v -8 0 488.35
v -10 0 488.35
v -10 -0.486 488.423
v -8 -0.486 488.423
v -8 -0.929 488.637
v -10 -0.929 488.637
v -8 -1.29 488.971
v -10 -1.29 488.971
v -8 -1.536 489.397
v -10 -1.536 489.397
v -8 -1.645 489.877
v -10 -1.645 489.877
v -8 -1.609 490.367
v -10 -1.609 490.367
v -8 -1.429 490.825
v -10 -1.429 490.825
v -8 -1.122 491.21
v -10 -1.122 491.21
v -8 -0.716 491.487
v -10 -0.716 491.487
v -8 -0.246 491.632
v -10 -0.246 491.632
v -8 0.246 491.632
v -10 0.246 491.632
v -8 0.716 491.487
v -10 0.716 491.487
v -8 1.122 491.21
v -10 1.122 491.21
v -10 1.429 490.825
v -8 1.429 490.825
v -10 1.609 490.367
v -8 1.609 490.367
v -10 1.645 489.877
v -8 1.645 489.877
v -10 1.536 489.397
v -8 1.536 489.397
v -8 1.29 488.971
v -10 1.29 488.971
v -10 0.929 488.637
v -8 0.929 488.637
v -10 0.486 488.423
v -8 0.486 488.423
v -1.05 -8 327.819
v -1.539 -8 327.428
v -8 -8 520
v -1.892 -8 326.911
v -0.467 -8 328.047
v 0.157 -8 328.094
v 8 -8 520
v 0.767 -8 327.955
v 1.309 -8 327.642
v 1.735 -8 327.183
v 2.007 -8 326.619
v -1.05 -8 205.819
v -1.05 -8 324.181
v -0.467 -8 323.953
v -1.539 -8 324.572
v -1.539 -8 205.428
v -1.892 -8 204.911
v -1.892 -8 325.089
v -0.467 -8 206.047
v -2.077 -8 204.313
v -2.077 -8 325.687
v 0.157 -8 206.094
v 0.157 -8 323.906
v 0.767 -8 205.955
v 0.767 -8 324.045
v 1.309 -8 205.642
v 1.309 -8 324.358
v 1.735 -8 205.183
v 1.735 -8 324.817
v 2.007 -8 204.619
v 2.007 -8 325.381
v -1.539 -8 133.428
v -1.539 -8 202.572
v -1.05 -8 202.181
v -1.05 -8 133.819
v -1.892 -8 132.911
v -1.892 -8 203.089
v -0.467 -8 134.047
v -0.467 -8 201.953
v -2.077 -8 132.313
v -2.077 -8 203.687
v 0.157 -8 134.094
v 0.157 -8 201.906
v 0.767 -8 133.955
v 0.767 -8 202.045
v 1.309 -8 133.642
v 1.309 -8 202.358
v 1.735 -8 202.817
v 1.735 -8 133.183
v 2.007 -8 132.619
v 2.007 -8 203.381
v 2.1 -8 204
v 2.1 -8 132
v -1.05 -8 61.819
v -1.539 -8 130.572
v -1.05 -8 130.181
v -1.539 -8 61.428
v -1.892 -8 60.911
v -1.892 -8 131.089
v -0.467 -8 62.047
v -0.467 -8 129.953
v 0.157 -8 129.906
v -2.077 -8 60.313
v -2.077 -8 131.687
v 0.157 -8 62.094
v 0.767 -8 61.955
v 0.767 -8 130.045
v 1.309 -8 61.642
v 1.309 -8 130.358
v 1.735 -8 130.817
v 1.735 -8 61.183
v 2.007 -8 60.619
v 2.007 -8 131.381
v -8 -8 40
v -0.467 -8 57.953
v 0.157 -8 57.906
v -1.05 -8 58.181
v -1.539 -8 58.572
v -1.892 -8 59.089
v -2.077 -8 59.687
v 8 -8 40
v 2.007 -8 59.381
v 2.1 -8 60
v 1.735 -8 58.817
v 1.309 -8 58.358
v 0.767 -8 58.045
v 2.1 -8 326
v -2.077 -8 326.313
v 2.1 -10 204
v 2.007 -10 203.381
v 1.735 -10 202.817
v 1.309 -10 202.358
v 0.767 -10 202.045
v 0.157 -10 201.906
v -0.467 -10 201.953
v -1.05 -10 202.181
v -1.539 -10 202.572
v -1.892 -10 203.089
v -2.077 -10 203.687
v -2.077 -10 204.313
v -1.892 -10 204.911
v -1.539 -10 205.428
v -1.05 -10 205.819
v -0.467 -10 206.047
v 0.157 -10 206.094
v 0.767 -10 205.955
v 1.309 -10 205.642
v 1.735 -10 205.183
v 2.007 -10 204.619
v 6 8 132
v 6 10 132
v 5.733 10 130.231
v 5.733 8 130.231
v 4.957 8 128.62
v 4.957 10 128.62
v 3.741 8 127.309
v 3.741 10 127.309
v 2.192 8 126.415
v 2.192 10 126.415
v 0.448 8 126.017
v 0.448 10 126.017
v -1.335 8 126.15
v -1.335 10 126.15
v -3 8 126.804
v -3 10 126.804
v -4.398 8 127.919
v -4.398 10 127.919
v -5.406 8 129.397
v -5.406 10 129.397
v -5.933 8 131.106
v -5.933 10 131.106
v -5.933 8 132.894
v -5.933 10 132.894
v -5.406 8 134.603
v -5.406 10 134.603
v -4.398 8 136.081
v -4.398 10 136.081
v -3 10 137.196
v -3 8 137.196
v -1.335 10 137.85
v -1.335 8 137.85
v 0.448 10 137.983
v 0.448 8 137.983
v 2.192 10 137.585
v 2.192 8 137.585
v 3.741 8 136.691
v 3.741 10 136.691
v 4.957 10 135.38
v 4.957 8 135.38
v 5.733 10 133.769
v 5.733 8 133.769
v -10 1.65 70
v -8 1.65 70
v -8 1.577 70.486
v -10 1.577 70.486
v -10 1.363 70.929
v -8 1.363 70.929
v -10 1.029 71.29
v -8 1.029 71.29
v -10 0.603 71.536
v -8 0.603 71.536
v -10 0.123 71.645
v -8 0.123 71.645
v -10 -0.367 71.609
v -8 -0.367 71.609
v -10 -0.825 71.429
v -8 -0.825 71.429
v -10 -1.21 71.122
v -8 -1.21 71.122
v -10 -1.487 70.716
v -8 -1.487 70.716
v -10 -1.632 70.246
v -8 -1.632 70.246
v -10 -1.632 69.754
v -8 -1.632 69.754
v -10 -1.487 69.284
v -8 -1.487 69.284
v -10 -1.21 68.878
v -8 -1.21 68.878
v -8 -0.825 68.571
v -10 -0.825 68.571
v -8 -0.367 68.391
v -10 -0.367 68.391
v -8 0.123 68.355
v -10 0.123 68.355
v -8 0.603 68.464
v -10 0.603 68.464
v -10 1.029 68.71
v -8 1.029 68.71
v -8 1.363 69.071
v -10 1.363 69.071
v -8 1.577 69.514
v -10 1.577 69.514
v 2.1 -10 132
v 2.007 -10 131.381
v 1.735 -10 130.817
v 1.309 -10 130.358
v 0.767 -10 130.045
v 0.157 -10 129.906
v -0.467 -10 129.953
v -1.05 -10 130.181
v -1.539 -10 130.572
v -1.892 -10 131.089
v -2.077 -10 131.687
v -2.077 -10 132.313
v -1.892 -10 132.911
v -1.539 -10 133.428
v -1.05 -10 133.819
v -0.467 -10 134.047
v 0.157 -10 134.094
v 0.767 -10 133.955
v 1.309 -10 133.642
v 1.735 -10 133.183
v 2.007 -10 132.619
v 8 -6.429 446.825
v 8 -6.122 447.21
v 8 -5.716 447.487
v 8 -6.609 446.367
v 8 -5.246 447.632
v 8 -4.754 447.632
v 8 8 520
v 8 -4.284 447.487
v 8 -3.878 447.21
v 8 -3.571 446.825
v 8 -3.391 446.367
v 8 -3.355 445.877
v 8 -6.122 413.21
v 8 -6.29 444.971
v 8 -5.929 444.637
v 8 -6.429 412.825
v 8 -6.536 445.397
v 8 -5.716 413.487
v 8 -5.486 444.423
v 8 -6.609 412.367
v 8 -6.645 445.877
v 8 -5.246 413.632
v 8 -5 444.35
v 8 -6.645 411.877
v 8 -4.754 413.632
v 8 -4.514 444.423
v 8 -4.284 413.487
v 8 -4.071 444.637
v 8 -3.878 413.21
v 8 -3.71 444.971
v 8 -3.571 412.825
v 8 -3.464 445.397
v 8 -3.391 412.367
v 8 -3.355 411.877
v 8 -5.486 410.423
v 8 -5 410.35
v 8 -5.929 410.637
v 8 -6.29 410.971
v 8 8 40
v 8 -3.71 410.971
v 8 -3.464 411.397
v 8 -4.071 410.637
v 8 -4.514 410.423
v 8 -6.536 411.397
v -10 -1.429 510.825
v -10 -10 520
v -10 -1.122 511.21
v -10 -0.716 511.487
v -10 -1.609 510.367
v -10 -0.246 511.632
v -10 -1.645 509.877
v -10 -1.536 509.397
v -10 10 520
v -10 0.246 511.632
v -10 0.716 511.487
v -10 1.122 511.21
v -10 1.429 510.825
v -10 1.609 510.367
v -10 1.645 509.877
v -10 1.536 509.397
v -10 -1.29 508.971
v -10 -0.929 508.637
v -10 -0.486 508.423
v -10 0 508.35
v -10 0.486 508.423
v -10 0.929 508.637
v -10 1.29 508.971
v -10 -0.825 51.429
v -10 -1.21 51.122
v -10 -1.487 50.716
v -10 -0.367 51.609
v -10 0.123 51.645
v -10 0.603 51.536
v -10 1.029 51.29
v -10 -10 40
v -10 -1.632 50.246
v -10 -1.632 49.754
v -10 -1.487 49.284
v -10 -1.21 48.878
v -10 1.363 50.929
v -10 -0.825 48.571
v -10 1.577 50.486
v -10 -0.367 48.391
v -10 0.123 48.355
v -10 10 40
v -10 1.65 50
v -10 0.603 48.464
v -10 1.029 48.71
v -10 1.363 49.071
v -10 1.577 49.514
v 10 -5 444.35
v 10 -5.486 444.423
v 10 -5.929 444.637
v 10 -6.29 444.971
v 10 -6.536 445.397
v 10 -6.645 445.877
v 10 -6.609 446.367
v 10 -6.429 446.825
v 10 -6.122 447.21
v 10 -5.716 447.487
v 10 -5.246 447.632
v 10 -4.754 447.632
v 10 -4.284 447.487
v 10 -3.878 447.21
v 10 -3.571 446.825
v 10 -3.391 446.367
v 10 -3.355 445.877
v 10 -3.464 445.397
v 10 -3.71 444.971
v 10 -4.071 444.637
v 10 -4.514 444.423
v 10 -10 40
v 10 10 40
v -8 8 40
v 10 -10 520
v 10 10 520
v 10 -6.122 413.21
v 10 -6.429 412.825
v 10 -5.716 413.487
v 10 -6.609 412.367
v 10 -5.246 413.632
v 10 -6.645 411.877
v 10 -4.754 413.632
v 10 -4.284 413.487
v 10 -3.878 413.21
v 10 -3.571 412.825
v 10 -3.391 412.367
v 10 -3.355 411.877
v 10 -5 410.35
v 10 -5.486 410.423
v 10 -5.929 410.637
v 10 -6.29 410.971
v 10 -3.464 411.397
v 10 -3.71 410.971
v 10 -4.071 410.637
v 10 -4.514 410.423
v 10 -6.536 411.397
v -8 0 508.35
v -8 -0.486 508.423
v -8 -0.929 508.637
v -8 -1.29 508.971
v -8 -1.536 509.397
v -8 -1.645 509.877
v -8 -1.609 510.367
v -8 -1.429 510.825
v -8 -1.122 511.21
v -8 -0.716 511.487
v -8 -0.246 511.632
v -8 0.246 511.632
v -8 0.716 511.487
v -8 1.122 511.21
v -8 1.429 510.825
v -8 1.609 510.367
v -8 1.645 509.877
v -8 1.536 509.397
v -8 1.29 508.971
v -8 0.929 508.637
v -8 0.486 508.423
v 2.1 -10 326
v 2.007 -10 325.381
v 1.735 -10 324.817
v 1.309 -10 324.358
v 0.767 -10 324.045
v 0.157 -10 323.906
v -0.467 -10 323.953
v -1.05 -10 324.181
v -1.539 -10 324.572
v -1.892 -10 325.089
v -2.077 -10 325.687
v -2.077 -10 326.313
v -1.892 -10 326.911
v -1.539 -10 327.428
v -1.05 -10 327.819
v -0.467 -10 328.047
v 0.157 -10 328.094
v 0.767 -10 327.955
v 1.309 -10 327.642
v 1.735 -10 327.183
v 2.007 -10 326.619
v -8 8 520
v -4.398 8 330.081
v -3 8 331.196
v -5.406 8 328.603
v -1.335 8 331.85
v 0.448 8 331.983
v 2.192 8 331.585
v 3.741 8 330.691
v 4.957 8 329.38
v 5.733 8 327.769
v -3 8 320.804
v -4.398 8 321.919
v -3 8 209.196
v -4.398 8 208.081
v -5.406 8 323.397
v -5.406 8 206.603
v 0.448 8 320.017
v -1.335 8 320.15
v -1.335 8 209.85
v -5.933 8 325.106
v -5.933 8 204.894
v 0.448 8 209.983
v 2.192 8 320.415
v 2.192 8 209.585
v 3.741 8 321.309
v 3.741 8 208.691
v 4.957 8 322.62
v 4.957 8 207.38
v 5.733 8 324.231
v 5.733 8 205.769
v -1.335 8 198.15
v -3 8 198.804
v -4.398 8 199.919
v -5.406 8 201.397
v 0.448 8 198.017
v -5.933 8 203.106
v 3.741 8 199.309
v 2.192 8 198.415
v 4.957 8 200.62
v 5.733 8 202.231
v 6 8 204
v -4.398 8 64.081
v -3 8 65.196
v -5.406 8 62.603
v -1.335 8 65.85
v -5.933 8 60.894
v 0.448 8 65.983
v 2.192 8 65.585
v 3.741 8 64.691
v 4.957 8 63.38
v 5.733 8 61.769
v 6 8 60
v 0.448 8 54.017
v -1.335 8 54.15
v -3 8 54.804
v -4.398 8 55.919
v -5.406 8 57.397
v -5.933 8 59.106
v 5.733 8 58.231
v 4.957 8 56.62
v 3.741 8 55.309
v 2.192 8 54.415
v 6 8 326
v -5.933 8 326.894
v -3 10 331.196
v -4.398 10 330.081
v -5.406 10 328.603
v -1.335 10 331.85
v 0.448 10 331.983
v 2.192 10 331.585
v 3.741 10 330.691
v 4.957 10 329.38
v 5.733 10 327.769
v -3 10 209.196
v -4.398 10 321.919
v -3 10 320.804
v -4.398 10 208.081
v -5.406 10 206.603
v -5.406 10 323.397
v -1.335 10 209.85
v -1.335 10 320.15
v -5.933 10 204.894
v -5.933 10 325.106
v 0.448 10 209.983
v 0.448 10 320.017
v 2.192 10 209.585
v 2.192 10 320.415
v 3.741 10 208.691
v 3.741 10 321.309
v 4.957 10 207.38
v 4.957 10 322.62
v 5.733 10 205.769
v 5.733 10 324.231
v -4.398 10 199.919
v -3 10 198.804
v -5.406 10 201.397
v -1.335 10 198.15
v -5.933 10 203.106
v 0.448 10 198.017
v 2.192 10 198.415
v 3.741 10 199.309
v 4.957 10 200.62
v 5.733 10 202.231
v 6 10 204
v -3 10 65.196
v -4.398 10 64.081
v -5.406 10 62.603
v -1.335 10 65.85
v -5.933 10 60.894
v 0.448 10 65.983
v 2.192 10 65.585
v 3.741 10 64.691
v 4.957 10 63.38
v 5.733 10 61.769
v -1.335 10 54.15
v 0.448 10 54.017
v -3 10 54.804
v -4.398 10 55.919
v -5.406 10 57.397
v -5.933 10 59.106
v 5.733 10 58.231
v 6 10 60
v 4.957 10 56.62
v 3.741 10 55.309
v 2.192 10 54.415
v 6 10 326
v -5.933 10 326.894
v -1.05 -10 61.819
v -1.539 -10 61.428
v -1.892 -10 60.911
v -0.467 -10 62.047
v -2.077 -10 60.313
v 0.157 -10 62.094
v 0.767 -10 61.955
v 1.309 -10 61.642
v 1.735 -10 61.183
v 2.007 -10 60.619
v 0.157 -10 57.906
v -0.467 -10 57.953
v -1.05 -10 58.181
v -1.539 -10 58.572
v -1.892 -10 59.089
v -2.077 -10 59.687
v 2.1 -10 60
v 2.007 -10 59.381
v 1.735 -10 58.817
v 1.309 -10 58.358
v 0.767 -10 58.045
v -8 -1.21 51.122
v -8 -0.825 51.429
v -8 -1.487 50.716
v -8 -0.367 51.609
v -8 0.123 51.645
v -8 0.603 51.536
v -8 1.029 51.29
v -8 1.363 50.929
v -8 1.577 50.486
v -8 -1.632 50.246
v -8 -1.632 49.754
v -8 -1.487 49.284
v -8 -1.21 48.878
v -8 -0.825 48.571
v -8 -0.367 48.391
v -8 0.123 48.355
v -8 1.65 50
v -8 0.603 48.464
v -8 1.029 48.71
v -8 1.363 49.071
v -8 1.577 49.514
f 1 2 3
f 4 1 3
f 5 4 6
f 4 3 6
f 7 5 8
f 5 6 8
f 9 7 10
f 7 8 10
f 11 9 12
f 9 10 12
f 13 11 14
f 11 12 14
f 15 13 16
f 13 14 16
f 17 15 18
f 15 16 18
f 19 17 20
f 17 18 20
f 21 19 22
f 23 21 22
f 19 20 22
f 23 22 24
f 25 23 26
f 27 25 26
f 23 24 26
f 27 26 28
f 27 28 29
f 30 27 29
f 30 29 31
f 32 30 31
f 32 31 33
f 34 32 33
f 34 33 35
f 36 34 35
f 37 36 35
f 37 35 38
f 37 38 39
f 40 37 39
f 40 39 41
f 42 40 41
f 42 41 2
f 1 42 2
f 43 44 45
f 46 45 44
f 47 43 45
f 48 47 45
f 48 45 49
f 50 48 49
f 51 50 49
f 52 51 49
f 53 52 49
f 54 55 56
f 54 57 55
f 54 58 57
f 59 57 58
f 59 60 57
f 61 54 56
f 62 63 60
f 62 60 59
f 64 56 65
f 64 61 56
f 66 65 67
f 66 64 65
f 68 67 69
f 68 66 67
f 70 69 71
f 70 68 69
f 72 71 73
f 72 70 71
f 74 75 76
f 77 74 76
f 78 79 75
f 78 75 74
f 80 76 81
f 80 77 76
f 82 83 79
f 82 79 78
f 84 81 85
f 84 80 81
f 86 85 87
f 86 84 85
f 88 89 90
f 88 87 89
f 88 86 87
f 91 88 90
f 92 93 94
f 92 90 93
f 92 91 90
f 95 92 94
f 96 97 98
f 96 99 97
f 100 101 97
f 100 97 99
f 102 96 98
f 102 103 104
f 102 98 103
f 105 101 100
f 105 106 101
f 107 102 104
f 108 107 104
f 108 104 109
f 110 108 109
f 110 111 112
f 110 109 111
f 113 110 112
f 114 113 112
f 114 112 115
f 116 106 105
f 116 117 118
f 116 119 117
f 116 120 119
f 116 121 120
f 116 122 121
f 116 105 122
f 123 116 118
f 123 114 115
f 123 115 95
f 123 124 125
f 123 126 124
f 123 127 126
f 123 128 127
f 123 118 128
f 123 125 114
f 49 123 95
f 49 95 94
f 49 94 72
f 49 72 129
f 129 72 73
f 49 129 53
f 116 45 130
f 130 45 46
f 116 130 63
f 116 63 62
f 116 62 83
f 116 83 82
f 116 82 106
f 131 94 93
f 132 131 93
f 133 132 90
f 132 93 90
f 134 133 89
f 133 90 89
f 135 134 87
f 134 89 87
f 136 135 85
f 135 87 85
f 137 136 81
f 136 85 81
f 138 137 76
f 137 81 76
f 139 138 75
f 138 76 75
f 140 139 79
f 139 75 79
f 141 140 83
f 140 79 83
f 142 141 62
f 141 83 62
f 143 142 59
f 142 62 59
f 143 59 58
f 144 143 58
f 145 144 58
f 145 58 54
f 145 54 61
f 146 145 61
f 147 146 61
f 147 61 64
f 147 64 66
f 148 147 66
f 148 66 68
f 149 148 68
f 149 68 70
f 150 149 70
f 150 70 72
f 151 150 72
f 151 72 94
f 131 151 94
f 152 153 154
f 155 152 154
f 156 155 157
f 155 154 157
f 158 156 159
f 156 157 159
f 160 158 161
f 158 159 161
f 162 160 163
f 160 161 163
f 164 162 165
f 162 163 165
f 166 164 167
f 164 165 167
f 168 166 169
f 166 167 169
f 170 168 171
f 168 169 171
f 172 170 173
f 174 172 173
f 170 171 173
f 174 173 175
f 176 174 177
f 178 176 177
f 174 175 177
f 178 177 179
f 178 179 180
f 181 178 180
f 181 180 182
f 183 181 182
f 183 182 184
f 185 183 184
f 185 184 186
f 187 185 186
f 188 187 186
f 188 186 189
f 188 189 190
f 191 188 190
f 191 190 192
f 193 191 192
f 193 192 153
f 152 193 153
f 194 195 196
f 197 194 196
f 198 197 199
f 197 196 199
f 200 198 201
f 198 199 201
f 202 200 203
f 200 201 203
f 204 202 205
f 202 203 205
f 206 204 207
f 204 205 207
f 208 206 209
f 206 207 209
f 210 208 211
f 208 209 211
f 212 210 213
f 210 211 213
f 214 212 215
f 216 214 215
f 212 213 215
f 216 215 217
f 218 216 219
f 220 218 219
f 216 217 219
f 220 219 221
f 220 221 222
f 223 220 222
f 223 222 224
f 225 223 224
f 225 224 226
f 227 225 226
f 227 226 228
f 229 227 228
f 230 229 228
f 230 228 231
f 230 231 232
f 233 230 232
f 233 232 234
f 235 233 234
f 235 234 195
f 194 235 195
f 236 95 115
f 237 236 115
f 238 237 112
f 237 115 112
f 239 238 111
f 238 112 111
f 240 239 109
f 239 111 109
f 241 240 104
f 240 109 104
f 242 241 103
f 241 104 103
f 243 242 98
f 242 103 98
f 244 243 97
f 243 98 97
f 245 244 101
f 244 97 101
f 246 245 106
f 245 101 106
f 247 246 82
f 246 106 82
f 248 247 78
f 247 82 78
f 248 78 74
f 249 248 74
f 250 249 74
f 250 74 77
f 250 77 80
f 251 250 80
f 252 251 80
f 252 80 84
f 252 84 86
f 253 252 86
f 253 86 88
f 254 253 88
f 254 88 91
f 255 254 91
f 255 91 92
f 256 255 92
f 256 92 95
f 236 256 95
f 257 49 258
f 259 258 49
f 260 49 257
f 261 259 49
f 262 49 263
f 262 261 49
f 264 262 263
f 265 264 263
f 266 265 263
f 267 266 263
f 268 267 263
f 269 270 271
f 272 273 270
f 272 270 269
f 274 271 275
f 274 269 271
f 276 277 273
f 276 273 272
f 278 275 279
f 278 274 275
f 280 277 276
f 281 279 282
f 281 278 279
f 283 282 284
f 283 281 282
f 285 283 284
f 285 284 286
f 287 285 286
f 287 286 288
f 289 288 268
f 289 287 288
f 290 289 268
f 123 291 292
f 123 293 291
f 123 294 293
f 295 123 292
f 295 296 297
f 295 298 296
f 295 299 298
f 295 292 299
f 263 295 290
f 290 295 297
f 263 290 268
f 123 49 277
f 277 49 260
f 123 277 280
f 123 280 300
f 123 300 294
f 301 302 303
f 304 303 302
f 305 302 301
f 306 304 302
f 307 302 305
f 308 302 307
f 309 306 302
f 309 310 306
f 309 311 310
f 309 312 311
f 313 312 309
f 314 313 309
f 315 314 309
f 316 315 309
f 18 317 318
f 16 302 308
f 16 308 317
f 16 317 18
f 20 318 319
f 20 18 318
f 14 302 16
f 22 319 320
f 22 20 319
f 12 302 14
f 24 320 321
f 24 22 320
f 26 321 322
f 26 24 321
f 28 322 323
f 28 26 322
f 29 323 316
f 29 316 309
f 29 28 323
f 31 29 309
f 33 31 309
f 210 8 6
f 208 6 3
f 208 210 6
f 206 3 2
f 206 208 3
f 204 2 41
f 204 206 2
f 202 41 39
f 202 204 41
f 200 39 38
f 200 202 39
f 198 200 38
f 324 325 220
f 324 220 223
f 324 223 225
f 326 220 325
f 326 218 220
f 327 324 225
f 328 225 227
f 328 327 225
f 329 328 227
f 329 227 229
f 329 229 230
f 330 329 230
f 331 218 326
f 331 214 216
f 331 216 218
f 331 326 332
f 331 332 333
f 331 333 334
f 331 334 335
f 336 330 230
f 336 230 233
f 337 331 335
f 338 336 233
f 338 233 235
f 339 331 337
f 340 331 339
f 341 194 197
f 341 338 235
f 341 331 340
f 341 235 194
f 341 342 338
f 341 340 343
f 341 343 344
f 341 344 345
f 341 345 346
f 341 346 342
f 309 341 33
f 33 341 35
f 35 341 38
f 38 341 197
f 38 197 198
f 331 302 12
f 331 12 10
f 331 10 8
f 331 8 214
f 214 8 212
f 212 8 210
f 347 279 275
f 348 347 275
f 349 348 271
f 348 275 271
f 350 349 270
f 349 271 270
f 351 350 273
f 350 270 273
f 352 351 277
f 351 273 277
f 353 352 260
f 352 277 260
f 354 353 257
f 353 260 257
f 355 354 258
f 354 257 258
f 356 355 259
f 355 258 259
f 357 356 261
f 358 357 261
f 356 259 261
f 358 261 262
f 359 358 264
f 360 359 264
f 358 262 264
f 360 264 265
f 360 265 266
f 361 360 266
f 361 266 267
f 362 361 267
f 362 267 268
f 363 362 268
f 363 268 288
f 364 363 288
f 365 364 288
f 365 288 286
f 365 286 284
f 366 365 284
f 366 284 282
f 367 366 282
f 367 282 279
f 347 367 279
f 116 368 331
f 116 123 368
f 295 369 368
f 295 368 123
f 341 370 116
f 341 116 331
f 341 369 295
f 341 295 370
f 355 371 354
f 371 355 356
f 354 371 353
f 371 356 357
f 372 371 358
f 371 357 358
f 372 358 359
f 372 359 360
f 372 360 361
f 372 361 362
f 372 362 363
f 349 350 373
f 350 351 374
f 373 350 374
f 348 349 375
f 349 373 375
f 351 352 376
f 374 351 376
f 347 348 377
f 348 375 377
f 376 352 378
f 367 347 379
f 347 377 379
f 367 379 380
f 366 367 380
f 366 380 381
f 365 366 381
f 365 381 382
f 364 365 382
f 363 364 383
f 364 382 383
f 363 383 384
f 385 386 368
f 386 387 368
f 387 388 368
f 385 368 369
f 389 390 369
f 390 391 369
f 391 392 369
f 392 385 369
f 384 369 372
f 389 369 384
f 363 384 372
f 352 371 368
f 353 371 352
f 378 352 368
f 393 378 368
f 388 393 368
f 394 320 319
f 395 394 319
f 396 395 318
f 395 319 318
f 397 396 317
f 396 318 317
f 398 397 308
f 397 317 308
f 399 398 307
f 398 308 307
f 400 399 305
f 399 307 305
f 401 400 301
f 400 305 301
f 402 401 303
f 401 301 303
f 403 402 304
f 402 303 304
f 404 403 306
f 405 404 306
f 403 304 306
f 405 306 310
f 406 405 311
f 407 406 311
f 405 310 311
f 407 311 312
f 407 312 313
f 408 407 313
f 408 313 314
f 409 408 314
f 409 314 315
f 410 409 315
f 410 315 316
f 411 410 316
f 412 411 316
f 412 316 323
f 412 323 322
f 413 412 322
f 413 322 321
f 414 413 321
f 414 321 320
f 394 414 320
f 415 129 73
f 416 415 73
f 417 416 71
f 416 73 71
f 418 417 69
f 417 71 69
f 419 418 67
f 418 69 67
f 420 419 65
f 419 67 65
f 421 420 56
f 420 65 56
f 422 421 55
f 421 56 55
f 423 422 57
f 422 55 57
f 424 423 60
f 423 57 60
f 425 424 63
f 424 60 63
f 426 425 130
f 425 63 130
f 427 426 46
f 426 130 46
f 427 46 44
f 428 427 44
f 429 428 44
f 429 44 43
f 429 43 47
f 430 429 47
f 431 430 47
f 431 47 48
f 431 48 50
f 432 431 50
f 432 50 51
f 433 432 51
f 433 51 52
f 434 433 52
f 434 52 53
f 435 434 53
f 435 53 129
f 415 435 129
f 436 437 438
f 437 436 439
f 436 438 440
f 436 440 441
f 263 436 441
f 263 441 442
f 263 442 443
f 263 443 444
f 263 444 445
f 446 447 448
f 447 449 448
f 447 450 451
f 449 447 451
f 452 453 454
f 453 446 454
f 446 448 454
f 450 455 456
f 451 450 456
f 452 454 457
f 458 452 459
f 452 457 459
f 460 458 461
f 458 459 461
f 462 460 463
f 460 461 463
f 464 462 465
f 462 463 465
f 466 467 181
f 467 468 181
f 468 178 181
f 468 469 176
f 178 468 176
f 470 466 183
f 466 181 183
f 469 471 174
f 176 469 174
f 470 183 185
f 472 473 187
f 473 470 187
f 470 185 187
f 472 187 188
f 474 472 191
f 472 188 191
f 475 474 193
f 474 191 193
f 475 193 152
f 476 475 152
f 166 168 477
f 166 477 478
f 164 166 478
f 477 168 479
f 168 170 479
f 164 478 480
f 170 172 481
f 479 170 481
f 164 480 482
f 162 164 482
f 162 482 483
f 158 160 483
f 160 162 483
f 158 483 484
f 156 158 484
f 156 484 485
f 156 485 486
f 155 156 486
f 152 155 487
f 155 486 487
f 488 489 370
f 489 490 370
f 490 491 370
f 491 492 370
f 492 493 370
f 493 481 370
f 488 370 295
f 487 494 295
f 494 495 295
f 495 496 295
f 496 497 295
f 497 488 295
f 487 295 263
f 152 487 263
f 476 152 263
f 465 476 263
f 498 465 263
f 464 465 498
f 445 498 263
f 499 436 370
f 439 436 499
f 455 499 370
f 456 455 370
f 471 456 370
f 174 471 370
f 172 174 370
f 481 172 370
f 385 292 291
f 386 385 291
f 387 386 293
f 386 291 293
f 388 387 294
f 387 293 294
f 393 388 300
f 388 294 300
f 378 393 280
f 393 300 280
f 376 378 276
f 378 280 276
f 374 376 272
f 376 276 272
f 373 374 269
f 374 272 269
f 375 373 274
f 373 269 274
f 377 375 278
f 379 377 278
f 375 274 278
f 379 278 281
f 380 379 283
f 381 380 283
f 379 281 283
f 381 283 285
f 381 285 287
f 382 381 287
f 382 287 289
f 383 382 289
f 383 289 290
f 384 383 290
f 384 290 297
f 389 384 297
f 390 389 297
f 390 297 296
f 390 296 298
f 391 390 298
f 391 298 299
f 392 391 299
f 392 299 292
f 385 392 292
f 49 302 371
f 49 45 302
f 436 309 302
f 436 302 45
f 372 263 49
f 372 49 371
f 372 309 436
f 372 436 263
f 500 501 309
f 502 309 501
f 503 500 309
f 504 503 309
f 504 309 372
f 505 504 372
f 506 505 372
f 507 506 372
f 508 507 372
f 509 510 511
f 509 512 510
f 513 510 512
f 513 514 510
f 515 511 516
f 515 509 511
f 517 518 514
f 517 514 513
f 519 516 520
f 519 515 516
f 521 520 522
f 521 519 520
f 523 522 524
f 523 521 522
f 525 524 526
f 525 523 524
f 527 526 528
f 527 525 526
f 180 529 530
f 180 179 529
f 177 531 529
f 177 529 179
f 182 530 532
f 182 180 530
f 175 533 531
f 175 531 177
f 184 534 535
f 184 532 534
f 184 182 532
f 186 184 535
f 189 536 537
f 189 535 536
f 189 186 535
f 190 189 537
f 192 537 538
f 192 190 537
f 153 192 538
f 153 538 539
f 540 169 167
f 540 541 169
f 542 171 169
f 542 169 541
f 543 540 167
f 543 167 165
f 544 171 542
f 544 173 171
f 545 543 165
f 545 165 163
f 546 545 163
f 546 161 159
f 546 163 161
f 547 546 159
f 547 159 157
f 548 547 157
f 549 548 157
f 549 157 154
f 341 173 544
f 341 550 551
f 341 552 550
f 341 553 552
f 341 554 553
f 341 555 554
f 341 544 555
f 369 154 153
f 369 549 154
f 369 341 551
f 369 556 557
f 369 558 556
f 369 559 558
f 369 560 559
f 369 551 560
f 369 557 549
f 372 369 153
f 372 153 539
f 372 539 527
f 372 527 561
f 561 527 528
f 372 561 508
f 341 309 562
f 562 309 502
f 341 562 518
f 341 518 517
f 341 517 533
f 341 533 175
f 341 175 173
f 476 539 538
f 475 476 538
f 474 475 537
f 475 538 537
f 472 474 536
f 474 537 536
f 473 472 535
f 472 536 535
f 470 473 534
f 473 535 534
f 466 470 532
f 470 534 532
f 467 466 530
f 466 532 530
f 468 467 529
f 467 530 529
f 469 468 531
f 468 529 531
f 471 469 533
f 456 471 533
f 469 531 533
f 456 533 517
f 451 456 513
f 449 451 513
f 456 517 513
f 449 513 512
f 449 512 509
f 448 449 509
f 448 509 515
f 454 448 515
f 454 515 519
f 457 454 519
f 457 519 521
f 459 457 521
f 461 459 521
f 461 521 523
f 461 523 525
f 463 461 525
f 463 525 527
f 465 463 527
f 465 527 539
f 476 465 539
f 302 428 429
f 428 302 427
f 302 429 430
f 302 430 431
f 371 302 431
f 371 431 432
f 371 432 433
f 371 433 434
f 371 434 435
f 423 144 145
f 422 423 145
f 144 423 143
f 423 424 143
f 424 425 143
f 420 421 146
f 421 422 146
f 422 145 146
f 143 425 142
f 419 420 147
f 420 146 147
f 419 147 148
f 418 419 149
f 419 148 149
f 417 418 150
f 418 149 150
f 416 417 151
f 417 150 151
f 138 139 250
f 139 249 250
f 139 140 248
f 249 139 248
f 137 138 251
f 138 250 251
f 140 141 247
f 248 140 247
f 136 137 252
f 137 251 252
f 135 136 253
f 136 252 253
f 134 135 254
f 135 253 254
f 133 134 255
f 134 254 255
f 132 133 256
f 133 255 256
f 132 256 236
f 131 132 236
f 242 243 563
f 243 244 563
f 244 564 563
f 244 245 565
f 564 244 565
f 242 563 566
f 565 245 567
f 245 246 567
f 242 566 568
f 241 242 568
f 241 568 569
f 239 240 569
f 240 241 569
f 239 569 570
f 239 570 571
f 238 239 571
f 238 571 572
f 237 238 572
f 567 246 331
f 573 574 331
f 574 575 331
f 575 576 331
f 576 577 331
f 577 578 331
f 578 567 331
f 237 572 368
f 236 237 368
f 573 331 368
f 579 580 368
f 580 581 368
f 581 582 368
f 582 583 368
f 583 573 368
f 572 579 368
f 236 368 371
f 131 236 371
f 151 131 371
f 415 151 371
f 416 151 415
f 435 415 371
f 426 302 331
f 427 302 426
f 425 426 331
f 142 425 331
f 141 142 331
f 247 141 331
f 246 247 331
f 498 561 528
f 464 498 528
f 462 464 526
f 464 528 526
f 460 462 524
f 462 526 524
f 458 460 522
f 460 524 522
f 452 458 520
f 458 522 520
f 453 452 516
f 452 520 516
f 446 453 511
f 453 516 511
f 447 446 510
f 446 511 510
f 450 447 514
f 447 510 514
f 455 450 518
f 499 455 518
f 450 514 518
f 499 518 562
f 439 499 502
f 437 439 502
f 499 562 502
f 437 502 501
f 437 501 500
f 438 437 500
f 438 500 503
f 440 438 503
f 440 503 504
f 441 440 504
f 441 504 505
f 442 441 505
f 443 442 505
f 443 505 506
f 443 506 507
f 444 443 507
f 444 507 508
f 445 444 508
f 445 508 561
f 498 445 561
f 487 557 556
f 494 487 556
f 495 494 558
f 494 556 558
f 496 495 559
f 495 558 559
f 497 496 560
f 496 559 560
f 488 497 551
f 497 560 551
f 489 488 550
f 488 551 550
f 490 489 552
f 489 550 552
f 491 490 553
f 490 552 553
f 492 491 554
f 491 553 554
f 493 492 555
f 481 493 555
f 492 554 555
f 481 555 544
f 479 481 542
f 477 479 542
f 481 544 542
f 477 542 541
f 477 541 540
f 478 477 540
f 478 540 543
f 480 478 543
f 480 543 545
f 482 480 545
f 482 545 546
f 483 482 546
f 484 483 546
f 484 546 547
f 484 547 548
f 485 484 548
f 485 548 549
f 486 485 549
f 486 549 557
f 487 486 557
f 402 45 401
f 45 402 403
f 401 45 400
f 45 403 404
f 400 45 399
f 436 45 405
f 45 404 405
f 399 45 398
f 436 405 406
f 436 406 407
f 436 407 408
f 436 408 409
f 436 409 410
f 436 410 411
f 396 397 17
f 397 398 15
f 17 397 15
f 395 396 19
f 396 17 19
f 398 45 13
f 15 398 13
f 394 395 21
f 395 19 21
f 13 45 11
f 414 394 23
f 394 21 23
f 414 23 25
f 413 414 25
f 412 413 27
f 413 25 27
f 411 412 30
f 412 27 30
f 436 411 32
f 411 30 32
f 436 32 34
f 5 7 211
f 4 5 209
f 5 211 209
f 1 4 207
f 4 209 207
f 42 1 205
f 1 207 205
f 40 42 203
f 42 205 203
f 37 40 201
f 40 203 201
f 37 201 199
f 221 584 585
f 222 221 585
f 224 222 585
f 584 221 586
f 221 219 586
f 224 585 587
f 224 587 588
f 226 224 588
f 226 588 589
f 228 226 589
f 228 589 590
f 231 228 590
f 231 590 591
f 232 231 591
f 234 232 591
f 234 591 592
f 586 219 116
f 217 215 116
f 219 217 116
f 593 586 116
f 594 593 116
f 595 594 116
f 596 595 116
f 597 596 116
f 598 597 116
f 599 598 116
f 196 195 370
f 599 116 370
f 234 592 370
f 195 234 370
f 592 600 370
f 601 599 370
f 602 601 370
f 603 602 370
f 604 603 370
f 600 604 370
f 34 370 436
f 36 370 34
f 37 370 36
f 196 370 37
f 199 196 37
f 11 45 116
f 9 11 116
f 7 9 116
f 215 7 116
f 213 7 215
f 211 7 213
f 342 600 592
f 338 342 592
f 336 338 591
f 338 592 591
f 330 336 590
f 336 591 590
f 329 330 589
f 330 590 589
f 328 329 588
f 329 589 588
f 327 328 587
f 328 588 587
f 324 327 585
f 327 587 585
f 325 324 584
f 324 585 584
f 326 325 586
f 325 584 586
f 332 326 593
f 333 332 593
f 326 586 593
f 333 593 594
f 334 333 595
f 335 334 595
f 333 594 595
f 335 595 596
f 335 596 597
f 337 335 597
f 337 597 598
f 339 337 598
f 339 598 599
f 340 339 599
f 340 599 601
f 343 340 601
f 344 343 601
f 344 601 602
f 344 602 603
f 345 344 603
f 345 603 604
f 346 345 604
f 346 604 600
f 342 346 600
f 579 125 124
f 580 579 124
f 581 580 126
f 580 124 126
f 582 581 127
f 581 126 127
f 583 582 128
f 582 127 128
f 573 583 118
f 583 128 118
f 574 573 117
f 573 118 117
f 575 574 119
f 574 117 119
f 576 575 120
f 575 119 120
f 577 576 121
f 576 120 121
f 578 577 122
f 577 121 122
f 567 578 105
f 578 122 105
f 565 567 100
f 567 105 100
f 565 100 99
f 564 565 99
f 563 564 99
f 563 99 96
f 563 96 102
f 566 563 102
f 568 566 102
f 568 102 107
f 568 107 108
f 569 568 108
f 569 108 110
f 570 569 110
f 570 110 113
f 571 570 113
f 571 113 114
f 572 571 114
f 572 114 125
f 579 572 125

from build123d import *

# Parameters (mm, degrees)
SKETCH_1_W               = 20
SKETCH_1_H               = 20
SKETCH_1_W_2             = 16
SKETCH_1_H_2             = 16
EXTRUDE_1_DEPTH          = 560
SKETCH_3_R               = 2.2
CUT_EXTRUDE_2_DEPTH      = 560
SKETCH_4_R               = 2.2
CUT_EXTRUDE_3_DEPTH      = 560
SKETCH_7_W               = 41.109335544
SKETCH_7_H               = 41.63539172
CUT_EXTRUDE_7_DEPTH      = 40
SKETCH_8_W               = 53.430317452
SKETCH_8_H               = 33.679555816
CUT_EXTRUDE_8_DEPTH      = 40
SKETCH_9_R               = 1
CUT_EXTRUDE_9_DEPTH      = 10
SKETCH_10_R              = 1
CUT_EXTRUDE_10_DEPTH     = 10
SKETCH_11_R              = 2.1
CUT_EXTRUDE_11_DEPTH     = 21
SKETCH_12_R              = 6
CUT_EXTRUDE_12_DEPTH     = 10
SKETCH_15_R              = 2.1
CUT_EXTRUDE_16_DEPTH     = 21
SKETCH_16_R              = 6
CUT_EXTRUDE_17_DEPTH     = 10
M4X0_7_6_D               = 3.3
M4X0_7_6_DEPTH           = 11.5
M4X0_7_6_TIP             = 0.991420021
M4X0_7_7_D               = 3.3
M4X0_7_7_DEPTH           = 11.5
M4X0_7_7_TIP             = 0.991420021
M4X0_7_7_ON_FACE_2_D     = 3.3
M4X0_7_7_ON_FACE_2_DEPTH = 11.5
M4X0_7_7_ON_FACE_2_TIP   = 0.991420021
SKETCH_26_R              = 1
CUT_EXTRUDE_18_DEPTH     = 10
M4X0_7_9_D               = 3.3
M4X0_7_9_DEPTH           = 11.5
M4X0_7_9_TIP             = 0.991420021


with BuildPart() as part:
    # ｽｹｯﾁ1 → ﾎﾞｽ - 押し出し1 (new body)
    with BuildSketch(Plane.XY):
        Rectangle(SKETCH_1_W, SKETCH_1_H)
        Rectangle(SKETCH_1_W_2, SKETCH_1_H_2, mode=Mode.SUBTRACT)
    extrude(amount=EXTRUDE_1_DEPTH)

    # ｽｹｯﾁ3 → ｶｯﾄ - 押し出し2 (cut)
    with BuildSketch(Plane(origin=(10, 0, 0), x_dir=(0, 0, -1), z_dir=(1, 0, 0))):
        with Locations((-530, 0)):
            Circle(SKETCH_3_R)
        with Locations((-30, 0)):
            Circle(SKETCH_3_R)
    extrude(amount=-CUT_EXTRUDE_2_DEPTH, mode=Mode.SUBTRACT)

    # ｽｹｯﾁ4 → ｶｯﾄ - 押し出し3 (cut)
    with BuildSketch(Plane(origin=(0, 10, 0), x_dir=(1, 0, 0), z_dir=(0, 1, 0))):
        with Locations((0, -550)):
            Circle(SKETCH_4_R)
        with Locations((0, -10)):
            Circle(SKETCH_4_R)
    extrude(amount=-CUT_EXTRUDE_3_DEPTH, mode=Mode.SUBTRACT)

    # ｽｹｯﾁ7 → ｶｯﾄ - 押し出し7 (cut)
    with BuildSketch(Plane(origin=(0, 0, 0), x_dir=(-1, 0, 0), z_dir=(0, 0, -1))):
        Rectangle(SKETCH_7_W, SKETCH_7_H)
    extrude(amount=-CUT_EXTRUDE_7_DEPTH, mode=Mode.SUBTRACT)

    # ｽｹｯﾁ8 → ｶｯﾄ - 押し出し8 (cut)
    with BuildSketch(Plane.XY.offset(560)):
        Rectangle(SKETCH_8_W, SKETCH_8_H)
    extrude(amount=-CUT_EXTRUDE_8_DEPTH, mode=Mode.SUBTRACT)

    # ｽｹｯﾁ9 → ｶｯﾄ - 押し出し9 (cut)
    with BuildSketch(Plane.ZY.offset(10)):
        with Locations((510, 0)):
            Circle(SKETCH_9_R)
        with Locations((490, 0)):
            Circle(SKETCH_9_R)
    extrude(amount=-CUT_EXTRUDE_9_DEPTH, mode=Mode.SUBTRACT)

    # ｽｹｯﾁ10 → ｶｯﾄ - 押し出し10 (cut)
    with BuildSketch(Plane.ZY.offset(10)):
        with Locations((50, 0)):
            Circle(SKETCH_10_R)
        with Locations((70, 0)):
            Circle(SKETCH_10_R)
    extrude(amount=-CUT_EXTRUDE_10_DEPTH, mode=Mode.SUBTRACT)

    # ｽｹｯﾁ11 → ｶｯﾄ - 押し出し11 (cut, through all)
    with BuildSketch(Plane(origin=(0, 10, 0), x_dir=(1, 0, 0), z_dir=(0, 1, 0))):
        with Locations((0, -60)):
            Circle(SKETCH_11_R)
        with Locations((0, -132)):
            Circle(SKETCH_11_R)
        with Locations((0, -204)):
            Circle(SKETCH_11_R)
    extrude(amount=-CUT_EXTRUDE_11_DEPTH, mode=Mode.SUBTRACT)

    # ｽｹｯﾁ12 → ｶｯﾄ - 押し出し12 (cut)
    with BuildSketch(Plane(origin=(0, 10, 0), x_dir=(1, 0, 0), z_dir=(0, 1, 0))):
        with Locations((0, -60)):
            Circle(SKETCH_12_R)
        with Locations((0, -132)):
            Circle(SKETCH_12_R)
        with Locations((0, -204)):
            Circle(SKETCH_12_R)
    extrude(amount=-CUT_EXTRUDE_12_DEPTH, mode=Mode.SUBTRACT)

    # ｽｹｯﾁ15 → ｶｯﾄ - 押し出し16 (cut, through all)
    with BuildSketch(Plane(origin=(0, 10, 0), x_dir=(1, 0, 0), z_dir=(0, 1, 0))):
        with Locations((0, -326)):
            Circle(SKETCH_15_R)
    extrude(amount=-CUT_EXTRUDE_16_DEPTH, mode=Mode.SUBTRACT)

    # ｽｹｯﾁ16 → ｶｯﾄ - 押し出し17 (cut)
    with BuildSketch(Plane(origin=(0, 10, 0), x_dir=(1, 0, 0), z_dir=(0, 1, 0))):
        with Locations((0, -326)):
            Circle(SKETCH_16_R)
    extrude(amount=-CUT_EXTRUDE_17_DEPTH, mode=Mode.SUBTRACT)

    # M4x0.7 ねじ穴6
    with Locations(Plane(origin=(-10, 0, 70), x_dir=(0, -1, 0), z_dir=(-1, 0, 0))):
        with Locations((0, 0), (0, -20)):
            Hole(M4X0_7_6_D / 2, depth=M4X0_7_6_DEPTH)
            with Locations((0, 0, -(M4X0_7_6_DEPTH + M4X0_7_6_TIP / 2))):  # 118° drill point
                Cone(0, M4X0_7_6_D / 2, M4X0_7_6_TIP, mode=Mode.SUBTRACT)

    # M4x0.7 ねじ穴7
    with Locations(Plane(origin=(-8, 0, 490), x_dir=(0, 0, 1), z_dir=(1, 0, 0))):
        with Locations((0, 0)):
            Hole(M4X0_7_7_D / 2, depth=M4X0_7_7_DEPTH)
            with Locations((0, 0, -(M4X0_7_7_DEPTH + M4X0_7_7_TIP / 2))):  # 118° drill point
                Cone(0, M4X0_7_7_D / 2, M4X0_7_7_TIP, mode=Mode.SUBTRACT)

    # M4x0.7 ねじ穴7 on face 2
    with Locations(Plane(origin=(-10, 0, 510), x_dir=(0, 0, 1), z_dir=(1, 0, 0))):
        with Locations((0, 0)):
            Hole(M4X0_7_7_ON_FACE_2_D / 2, depth=M4X0_7_7_ON_FACE_2_DEPTH)
            with Locations((0, 0, -(M4X0_7_7_ON_FACE_2_DEPTH + M4X0_7_7_ON_FACE_2_TIP / 2))):  # 118° drill point
                Cone(0, M4X0_7_7_ON_FACE_2_D / 2, M4X0_7_7_ON_FACE_2_TIP, mode=Mode.SUBTRACT)

    # ｽｹｯﾁ26 → ｶｯﾄ - 押し出し18 (cut)
    with BuildSketch(Plane(origin=(10, 0, 0), x_dir=(0, 0, -1), z_dir=(1, 0, 0))):
        with Locations((-446, -5)):
            Circle(SKETCH_26_R)
        with Locations((-412, -5)):
            Circle(SKETCH_26_R)
    extrude(amount=-CUT_EXTRUDE_18_DEPTH, mode=Mode.SUBTRACT)

    # M4x0.7 ねじ穴9
    with Locations(Plane(origin=(10, -5, 446), x_dir=(0, 0, 1), z_dir=(1, 0, 0))):
        with Locations((0, 0), (-34, 0)):
            Hole(M4X0_7_9_D / 2, depth=M4X0_7_9_DEPTH)
            with Locations((0, 0, -(M4X0_7_9_DEPTH + M4X0_7_9_TIP / 2))):  # 118° drill point
                Cone(0, M4X0_7_9_D / 2, M4X0_7_9_TIP, mode=Mode.SUBTRACT)


solid = part.part
